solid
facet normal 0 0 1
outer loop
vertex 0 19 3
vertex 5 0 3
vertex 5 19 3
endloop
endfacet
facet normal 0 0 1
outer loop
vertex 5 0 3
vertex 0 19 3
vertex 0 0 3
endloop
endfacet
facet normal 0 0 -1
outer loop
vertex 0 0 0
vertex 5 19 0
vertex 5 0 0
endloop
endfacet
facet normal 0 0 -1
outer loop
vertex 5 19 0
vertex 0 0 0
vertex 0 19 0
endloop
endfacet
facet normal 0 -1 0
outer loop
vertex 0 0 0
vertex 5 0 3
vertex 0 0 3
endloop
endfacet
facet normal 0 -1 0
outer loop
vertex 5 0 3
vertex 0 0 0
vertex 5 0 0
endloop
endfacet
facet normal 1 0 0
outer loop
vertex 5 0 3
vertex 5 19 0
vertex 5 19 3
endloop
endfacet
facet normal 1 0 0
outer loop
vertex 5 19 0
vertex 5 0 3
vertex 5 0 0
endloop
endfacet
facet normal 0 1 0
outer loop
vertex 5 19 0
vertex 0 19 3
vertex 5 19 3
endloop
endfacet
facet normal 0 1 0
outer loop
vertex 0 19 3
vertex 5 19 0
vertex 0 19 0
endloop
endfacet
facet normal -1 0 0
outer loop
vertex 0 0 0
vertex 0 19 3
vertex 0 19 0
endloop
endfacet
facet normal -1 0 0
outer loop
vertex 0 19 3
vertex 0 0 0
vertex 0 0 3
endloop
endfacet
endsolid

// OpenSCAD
// Generated by SolidPython 1.0.1 on 2020-07-29 00:46:54


cube(size = [5, 19, 3]);
/***********************************************
*********      SolidPython code:      **********
************************************************
 
# import packages: SolidPython
from solid import *
from solid.utils import *
from itertools import chain, combinations, permutations


class Resize:

    def __init__(self, scad_file):
        self.scad_file = scad_file
        #self.scad_file = import_scad(scad_file)
        # cone/cylinder param:
        self.r1 = 0
        self.r2 = 0
        self.h = 0
        # rectangular prism param:
        self.w = 0
        self.l = 0
        # ellipse param:
        self.r = 0

    # import OpenScad code (file name corresponds to shape)


    # classify shape + parameters
    def assign(self, param1, param2, param3):
        if self.scad_file == 'cone.scad':
            self.r1 = param1
            self.r2 = param2
            self.h = param3
        elif self.scad_file == 'cylinder.scad':
            self.r1 = param1
            self.r2 = param2
            self.h = param3
        elif self.scad_file == 'rectangularPrism.scad':
            self.h = param1
            self.l = param2
            self.w = param3
        else:
            self.r = param1
            self.h = param2

    # resize parameters
    def iterate(self):
        x = range(3, 20, 2)
        i = 1
        if self.scad_file == 'cone.scad':
            tempList = list(permutations(x, 2))
            for temp in tempList:
                param1 = temp[0]
                param2 = temp[1]
                filepath = 'produced_scad_files/' + 'cone' + str(param1) + '_' + str(param2) + '_' + '.scad'
                scad_render_to_file(cylinder(h=param1, r1=param2, r2=0), filepath)

        elif self.scad_file == 'cylinder.scad':
            tempList = list(permutations(x, 3))
            for temp in tempList:
                param1 = temp[0]
                param2 = temp[1]
                filepath = 'produced_scad_files/' + 'cylinder' + str(param1) + '_' + str(param2) + '_' + '.scad'
                scad_render_to_file(cylinder(h=param1, r1=param2, r2=param2), filepath)

        elif self.scad_file == 'rectangularPrism.scad':
            tempList = list(permutations(x, 3))
            for temp in tempList:
                param1 = temp[0]
                param2 = temp[1]
                param3 = temp[2]
                filepath = 'produced_scad_files/' + 'rectangularPrism' + str(param1) + '_' + str(param2) + '_' + str(
                    param3) + '.scad'
                scad_render_to_file(cube(size=(param1, param2, param3)), filepath)

        elif self.scad_file == 'ellipse.scad':
            tempList = list(permutations(x, 4))
            for temp in tempList:
                param1 = temp[0]
                param2 = temp[1]
                param3 = temp[2]
                param4 = temp[3]
                filepath = 'produced_scad_files/' + 'ellipse' + str(param1) + '_' + str(param2) + '_' + str(param3) + '_' + str(param4) + '.scad'
                scad_render_to_file(scale([param1, param2, param3])(sphere(r=param4)), filepath)

    def render_to_scadfile(self):
        scad_render_to_file(scad, 'example.scad') 
 
************************************************/
